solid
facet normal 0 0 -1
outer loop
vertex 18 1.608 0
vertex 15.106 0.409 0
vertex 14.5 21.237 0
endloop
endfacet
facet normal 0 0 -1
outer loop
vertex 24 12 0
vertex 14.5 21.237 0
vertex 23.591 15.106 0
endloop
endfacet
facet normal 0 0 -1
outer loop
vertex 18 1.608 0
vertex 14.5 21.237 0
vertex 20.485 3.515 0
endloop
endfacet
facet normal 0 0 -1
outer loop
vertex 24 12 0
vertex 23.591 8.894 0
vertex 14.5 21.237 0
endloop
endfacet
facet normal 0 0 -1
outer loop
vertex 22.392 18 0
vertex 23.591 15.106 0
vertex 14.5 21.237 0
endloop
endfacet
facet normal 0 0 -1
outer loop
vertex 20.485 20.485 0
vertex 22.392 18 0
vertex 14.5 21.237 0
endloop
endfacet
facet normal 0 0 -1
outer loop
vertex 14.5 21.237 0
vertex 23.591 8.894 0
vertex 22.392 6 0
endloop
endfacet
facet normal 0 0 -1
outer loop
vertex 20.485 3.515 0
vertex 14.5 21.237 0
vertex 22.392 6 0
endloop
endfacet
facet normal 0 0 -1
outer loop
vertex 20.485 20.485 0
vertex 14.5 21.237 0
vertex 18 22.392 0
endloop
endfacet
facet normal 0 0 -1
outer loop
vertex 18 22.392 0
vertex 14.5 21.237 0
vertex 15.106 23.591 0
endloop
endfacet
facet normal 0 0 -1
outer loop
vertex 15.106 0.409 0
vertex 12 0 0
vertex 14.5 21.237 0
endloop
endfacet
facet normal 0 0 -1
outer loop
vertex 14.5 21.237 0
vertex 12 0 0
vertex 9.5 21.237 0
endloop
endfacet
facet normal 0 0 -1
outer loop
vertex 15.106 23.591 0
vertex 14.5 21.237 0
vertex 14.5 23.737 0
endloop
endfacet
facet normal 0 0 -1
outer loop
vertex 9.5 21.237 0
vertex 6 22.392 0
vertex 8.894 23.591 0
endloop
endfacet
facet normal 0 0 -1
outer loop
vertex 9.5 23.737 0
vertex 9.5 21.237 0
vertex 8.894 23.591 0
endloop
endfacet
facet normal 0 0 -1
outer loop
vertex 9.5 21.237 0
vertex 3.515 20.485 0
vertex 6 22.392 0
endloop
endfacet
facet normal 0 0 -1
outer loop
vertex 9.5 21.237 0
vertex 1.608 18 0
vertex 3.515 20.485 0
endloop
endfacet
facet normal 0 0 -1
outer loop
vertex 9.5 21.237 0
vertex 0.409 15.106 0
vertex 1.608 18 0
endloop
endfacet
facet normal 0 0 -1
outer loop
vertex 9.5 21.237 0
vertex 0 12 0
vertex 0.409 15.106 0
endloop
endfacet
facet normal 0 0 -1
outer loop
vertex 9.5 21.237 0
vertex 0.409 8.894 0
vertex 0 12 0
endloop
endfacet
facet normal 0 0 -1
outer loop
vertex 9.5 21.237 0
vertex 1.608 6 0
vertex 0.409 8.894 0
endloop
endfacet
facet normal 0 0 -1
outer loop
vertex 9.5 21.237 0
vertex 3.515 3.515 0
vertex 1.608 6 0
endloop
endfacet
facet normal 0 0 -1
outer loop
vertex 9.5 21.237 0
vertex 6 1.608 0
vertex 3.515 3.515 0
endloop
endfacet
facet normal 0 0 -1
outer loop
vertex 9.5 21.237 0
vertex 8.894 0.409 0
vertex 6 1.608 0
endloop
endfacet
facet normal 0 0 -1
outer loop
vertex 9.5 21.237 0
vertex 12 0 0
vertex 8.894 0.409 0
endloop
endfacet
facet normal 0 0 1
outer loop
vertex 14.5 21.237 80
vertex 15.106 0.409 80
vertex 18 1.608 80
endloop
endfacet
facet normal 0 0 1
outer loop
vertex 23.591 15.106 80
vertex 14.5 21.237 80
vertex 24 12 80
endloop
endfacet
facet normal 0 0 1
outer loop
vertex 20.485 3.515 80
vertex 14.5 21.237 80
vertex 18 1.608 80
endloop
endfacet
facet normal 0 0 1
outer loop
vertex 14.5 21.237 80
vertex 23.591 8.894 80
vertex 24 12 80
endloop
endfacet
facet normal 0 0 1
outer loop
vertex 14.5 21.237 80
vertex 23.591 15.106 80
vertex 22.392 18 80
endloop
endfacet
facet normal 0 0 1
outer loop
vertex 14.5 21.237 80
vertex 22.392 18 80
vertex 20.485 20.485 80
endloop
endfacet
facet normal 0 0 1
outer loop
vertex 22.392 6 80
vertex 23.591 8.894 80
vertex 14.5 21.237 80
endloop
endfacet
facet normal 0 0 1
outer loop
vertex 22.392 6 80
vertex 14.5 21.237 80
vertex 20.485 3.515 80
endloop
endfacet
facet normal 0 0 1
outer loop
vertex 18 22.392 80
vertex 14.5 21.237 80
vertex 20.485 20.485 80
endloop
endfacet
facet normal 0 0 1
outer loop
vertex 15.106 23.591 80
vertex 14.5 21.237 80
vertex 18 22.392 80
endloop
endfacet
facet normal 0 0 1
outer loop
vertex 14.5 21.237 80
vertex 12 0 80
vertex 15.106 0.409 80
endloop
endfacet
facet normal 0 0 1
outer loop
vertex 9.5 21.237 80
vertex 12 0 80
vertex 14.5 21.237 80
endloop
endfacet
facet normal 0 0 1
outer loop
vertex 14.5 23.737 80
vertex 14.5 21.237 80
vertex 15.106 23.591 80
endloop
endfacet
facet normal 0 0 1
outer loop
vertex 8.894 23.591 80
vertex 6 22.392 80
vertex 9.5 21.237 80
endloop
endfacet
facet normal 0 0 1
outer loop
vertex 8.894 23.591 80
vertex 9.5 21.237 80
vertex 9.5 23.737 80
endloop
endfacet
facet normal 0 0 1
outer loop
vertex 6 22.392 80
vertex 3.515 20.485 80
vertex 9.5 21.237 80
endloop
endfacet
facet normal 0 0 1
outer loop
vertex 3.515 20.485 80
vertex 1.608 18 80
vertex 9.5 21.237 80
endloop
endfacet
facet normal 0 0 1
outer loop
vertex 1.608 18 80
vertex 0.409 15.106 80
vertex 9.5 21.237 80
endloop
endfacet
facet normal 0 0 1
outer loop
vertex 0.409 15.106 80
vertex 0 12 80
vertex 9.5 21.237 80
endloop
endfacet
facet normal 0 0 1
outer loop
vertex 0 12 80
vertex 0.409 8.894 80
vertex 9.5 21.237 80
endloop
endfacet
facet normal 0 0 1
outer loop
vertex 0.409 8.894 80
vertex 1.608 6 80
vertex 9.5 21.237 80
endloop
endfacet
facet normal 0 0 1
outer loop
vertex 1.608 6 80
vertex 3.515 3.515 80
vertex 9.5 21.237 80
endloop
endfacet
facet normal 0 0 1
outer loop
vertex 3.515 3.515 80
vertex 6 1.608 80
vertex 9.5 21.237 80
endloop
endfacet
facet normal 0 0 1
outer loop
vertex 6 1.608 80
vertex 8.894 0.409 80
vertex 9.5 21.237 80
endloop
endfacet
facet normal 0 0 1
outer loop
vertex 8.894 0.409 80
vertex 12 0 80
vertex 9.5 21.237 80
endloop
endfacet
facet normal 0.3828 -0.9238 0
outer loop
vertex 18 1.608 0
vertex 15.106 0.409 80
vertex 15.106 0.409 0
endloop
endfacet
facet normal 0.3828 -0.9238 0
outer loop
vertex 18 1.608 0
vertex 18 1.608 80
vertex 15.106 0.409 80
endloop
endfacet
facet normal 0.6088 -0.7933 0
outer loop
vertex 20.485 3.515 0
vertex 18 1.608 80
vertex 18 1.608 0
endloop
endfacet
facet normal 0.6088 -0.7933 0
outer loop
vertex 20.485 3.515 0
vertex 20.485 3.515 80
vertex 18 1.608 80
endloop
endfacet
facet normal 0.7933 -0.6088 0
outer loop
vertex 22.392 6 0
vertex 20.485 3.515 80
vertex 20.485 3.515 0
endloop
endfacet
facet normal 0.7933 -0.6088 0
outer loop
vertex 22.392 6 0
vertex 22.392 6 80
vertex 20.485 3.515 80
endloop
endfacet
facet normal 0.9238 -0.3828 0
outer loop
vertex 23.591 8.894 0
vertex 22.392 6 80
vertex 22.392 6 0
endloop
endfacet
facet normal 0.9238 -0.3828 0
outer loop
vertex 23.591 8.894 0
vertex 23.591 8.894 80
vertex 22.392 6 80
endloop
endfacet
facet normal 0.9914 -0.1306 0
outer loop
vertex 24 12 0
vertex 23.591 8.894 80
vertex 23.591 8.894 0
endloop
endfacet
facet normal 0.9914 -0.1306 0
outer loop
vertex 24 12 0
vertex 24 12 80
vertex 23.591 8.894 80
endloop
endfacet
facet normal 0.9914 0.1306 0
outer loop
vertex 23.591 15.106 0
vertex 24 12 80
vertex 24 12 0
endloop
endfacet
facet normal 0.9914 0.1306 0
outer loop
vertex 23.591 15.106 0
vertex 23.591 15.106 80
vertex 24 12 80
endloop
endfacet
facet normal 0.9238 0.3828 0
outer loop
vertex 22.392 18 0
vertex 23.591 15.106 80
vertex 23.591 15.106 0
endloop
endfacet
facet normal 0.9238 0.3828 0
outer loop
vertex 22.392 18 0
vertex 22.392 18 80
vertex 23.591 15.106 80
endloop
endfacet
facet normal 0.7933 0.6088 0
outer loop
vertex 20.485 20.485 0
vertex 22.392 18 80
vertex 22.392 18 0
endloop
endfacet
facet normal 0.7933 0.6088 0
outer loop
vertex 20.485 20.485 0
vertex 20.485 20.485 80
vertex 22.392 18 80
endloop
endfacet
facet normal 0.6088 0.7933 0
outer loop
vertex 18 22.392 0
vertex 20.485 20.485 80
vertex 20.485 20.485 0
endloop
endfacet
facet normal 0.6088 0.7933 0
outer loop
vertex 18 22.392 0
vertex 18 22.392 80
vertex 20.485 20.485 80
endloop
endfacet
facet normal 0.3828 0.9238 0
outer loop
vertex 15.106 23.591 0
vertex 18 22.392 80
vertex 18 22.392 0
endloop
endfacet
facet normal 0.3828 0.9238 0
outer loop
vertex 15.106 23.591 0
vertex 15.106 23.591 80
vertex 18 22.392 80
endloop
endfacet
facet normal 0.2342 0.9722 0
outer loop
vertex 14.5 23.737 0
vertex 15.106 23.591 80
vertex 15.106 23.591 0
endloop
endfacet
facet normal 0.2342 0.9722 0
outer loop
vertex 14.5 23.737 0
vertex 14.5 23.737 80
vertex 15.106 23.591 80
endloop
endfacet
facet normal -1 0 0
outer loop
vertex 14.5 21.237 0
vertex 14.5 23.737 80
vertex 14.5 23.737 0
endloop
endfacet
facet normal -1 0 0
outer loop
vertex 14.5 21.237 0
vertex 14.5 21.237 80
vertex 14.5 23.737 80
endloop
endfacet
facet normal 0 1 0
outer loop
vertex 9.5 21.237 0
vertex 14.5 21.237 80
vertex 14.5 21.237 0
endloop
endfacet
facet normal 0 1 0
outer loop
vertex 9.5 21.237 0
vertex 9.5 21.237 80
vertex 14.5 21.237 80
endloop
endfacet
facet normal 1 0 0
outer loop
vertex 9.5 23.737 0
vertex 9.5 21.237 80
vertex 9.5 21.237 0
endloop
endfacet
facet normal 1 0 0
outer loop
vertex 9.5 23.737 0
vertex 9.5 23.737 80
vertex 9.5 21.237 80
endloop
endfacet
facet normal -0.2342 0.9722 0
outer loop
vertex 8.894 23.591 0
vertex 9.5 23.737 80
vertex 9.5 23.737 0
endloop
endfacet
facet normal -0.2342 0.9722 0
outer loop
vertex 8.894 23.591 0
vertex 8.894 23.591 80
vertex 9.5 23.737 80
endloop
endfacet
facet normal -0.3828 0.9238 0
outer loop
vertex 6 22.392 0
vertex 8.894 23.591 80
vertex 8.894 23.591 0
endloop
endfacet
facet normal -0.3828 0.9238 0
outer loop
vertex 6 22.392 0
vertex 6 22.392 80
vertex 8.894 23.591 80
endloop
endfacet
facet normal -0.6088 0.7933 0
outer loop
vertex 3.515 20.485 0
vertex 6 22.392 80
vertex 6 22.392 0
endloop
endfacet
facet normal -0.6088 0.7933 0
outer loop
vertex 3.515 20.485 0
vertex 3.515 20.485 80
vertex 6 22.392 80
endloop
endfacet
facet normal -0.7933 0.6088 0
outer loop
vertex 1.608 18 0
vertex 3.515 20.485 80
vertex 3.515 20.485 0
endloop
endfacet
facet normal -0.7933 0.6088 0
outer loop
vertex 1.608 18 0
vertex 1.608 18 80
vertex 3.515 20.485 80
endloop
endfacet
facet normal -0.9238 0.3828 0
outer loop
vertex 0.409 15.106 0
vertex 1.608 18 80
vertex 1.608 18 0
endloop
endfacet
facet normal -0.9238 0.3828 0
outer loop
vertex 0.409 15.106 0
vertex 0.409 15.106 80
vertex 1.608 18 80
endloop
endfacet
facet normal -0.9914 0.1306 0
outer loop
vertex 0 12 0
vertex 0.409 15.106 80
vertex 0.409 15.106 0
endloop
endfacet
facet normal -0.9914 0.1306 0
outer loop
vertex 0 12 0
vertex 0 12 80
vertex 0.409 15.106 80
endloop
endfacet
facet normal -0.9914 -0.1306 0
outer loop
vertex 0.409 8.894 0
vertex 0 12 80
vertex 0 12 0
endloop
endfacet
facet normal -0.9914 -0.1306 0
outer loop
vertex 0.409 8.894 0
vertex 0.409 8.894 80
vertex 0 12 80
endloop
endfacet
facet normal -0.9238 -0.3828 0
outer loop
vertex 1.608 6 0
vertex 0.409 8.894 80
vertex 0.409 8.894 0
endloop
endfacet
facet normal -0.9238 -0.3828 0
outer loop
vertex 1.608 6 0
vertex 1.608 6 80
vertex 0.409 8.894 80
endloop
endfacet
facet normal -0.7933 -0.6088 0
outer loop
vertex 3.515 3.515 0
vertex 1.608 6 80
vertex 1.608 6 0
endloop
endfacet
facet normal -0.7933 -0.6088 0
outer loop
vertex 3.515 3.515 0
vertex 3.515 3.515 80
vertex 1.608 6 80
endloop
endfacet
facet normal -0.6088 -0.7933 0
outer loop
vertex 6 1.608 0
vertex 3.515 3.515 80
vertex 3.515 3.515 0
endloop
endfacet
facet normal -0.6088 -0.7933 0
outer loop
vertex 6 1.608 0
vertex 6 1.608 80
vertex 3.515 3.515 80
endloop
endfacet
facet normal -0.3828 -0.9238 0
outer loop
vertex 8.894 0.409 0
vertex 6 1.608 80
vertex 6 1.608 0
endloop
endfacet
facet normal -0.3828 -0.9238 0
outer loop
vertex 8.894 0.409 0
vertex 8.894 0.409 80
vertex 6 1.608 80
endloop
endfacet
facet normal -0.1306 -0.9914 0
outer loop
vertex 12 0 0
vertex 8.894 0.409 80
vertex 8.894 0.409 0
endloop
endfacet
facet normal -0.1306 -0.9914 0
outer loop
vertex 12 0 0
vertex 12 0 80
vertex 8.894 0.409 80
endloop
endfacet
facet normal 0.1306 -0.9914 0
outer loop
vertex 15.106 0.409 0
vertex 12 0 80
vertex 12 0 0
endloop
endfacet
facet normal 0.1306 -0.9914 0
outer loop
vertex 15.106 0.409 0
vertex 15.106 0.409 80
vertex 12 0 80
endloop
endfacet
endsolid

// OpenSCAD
$fn = 32;

// ----------------------------------------------------------------------
// Keyway shaft: d24 shaft, key 5 x 2.5 mm
// ----------------------------------------------------------------------

// --- parameters (mm) ---
shaft_r = 12;             // shaft radius
key_w = 5;                // keyway width
key_d = 2.5;              // keyway depth below the surface line
plate_t = 80;             // shaft length, Z (extrusion height)

shaft_d = 2 * shaft_r;  // shaft diameter
circle_step = 15;  // polygon sampling step, degrees

profile = [[8.894, 23.591], [6, 22.392], [3.515, 20.485], [1.608, 18], [0.409, 15.106], [0, 12], [0.409, 8.894], [1.608, 6], [3.515, 3.515], [6, 1.608], [8.894, 0.409], [12, 0], [15.106, 0.409], [18, 1.608], [20.485, 3.515], [22.392, 6], [23.591, 8.894], [24, 12], [23.591, 15.106], [22.392, 18], [20.485, 20.485], [18, 22.392], [15.106, 23.591], [14.5, 23.737], [14.5, 21.237], [9.5, 21.237], [9.5, 23.737]];  // primary outline, 27 points, counter clockwise

// --- the one profile operation ---
linear_extrude(height = plate_t) polygon(points = profile);
